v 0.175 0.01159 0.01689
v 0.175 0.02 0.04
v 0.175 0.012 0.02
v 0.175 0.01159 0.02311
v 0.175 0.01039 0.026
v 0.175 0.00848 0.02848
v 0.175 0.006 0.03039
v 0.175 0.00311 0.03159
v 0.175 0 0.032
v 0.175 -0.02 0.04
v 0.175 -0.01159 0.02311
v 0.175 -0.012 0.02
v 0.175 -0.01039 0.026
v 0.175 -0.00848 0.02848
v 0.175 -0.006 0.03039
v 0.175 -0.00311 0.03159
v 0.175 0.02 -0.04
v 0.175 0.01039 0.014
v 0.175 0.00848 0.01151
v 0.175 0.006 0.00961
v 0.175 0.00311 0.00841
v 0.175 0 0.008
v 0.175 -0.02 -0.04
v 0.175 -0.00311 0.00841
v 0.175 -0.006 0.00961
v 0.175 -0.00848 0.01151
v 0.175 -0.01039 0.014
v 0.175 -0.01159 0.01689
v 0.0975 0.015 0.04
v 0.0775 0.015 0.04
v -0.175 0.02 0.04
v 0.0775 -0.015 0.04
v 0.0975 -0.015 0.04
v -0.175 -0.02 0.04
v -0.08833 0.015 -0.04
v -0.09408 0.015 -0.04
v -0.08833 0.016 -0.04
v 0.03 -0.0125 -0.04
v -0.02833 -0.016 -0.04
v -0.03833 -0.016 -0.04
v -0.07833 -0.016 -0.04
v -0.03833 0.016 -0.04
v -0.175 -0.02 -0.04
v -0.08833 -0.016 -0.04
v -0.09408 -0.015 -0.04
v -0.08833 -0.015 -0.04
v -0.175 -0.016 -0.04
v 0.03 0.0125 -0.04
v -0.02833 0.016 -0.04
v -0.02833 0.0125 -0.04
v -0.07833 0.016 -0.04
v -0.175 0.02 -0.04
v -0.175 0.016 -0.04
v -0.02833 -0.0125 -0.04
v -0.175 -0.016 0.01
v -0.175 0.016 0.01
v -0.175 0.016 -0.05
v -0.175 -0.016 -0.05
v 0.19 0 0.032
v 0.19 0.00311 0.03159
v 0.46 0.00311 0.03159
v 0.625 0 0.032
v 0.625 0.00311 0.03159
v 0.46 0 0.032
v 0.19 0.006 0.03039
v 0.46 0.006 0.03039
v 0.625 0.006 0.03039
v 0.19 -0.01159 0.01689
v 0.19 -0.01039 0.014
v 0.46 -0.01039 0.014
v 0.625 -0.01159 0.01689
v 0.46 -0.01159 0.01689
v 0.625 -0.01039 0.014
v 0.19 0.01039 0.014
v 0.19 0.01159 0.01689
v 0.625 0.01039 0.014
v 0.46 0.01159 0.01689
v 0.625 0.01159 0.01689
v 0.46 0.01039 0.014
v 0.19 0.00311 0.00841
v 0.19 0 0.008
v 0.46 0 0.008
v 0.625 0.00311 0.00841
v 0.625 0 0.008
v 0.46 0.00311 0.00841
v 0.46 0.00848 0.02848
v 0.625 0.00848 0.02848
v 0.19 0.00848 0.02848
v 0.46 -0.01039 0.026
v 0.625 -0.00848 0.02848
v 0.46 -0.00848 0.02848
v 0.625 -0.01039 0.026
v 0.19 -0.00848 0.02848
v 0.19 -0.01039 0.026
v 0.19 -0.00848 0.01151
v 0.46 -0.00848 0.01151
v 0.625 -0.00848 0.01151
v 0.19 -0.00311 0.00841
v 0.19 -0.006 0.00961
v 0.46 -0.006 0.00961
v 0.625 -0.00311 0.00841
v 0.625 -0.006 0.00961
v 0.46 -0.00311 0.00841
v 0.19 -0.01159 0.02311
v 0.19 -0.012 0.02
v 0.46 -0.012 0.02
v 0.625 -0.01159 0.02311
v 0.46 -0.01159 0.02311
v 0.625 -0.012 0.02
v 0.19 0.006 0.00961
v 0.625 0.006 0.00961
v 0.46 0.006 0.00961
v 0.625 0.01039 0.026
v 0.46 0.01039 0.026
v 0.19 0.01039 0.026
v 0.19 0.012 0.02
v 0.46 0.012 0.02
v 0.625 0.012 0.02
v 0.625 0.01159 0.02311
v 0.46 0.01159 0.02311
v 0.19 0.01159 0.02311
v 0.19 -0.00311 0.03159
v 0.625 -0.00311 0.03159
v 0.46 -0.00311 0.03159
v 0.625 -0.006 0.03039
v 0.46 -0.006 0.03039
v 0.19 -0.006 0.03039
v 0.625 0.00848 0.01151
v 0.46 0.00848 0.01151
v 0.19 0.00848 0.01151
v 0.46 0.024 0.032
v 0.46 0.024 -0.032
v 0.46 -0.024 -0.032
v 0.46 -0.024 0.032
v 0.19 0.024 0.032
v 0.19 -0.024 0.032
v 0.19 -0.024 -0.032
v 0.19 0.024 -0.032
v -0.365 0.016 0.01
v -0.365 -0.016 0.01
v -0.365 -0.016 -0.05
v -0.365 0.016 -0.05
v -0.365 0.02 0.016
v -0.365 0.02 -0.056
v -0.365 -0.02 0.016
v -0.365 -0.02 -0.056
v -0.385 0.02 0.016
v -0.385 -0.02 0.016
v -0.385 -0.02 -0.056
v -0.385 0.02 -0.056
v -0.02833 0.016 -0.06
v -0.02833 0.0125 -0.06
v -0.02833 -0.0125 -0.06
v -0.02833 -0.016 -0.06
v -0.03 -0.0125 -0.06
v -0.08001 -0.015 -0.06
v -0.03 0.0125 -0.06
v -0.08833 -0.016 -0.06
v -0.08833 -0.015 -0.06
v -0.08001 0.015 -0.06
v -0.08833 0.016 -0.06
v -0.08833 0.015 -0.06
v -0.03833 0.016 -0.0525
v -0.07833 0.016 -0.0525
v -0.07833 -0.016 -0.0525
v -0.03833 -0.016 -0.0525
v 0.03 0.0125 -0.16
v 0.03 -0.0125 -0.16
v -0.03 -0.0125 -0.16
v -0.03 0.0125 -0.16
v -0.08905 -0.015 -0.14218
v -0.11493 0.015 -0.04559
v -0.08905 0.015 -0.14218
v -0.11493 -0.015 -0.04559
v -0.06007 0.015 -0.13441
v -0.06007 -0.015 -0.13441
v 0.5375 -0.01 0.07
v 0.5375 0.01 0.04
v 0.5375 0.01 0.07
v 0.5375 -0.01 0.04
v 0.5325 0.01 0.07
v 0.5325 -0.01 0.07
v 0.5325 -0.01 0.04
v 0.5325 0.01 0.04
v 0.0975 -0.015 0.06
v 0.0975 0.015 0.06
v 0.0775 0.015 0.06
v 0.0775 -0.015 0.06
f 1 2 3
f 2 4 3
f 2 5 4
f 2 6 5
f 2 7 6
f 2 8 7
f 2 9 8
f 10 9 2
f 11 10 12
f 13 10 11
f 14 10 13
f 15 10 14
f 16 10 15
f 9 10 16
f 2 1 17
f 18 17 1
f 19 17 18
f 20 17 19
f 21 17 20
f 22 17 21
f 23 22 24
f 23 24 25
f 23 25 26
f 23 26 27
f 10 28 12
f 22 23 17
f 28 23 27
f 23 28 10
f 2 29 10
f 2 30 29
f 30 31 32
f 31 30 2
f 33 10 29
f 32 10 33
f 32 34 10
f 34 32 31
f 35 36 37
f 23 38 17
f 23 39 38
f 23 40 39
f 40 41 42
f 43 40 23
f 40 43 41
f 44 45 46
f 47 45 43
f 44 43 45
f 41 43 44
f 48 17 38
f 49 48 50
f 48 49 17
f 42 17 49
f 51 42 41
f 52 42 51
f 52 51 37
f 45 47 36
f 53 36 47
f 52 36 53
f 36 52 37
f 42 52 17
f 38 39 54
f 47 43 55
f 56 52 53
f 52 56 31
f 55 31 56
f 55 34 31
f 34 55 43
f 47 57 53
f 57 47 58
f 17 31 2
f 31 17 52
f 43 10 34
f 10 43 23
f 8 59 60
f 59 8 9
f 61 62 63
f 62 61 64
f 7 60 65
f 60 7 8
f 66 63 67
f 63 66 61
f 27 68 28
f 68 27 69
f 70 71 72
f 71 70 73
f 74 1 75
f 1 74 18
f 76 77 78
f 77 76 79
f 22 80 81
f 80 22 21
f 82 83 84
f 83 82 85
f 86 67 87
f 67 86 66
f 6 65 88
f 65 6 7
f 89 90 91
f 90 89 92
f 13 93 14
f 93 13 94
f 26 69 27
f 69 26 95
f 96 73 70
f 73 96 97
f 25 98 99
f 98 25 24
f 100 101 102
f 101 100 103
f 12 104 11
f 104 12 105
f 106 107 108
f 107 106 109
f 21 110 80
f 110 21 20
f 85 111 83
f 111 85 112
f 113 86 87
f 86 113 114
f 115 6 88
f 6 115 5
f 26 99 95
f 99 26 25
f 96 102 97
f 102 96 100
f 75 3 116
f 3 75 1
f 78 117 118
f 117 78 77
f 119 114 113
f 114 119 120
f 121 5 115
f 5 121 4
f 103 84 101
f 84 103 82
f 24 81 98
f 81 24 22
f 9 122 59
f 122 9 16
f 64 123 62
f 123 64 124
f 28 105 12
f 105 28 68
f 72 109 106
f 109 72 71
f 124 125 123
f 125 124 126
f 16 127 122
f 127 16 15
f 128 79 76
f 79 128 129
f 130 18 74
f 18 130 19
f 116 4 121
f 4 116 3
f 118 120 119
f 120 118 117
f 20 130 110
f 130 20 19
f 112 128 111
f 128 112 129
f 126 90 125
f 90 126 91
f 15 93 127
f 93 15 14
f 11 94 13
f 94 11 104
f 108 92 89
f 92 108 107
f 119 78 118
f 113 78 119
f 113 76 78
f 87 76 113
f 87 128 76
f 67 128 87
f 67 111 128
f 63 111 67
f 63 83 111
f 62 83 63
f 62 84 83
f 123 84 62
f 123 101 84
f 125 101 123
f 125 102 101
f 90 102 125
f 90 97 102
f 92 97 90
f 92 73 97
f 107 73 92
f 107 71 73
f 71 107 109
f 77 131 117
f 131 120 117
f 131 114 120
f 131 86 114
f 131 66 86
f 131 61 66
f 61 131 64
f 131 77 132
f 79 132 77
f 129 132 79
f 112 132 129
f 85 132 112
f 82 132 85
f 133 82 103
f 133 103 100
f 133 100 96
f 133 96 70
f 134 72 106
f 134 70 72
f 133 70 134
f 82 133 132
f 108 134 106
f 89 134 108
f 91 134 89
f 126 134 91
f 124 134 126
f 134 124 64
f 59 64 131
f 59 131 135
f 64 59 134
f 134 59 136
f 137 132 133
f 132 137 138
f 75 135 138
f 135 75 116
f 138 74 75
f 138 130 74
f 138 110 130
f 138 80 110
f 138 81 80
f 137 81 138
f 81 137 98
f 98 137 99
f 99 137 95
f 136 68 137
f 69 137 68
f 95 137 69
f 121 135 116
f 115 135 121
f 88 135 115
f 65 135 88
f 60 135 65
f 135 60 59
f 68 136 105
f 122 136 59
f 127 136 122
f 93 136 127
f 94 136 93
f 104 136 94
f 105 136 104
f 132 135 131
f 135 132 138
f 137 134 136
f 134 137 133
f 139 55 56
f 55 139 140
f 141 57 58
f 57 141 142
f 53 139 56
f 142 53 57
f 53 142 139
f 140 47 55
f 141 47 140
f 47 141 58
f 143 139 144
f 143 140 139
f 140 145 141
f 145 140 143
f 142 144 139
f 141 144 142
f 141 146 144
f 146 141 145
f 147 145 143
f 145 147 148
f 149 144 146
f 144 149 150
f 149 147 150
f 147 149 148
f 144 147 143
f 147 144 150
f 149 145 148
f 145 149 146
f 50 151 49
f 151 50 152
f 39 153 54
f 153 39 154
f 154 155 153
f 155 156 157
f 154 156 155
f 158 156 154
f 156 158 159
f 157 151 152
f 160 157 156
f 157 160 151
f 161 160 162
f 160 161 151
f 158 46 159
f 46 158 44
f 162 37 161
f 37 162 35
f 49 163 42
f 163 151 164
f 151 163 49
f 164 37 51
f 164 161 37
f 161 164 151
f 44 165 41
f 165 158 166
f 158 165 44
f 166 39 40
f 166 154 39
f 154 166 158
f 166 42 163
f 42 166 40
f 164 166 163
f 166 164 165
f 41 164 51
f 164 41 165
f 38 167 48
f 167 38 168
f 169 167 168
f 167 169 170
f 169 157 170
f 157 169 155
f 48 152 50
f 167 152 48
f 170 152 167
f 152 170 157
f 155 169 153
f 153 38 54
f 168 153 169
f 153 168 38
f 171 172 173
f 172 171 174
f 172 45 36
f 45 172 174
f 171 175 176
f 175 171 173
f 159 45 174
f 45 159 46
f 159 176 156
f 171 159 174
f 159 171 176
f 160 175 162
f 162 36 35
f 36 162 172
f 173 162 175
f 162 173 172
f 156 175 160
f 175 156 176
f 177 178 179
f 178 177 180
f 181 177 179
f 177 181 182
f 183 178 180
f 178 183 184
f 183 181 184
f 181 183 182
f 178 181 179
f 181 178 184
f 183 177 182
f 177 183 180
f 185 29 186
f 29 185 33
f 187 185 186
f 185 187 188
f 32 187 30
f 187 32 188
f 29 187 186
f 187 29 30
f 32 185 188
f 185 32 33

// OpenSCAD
// Arena Shooter - Rifle Model
// Assault rifle style weapon (~80cm long)
// Units in meters

$fn = 24;

// Rifle dimensions
total_length = 0.8;
barrel_length = 0.45;
barrel_radius = 0.012;
body_length = 0.35;
body_height = 0.08;
body_width = 0.04;
stock_length = 0.2;
stock_height = 0.06;
mag_height = 0.12;
mag_width = 0.025;
mag_depth = 0.06;
grip_height = 0.1;
grip_width = 0.03;

module rifle() {
    color([0.2, 0.2, 0.2]) {
        // Main body/receiver
        translate([0, 0, 0])
            cube([body_length, body_width, body_height], center=true);

        // Barrel
        translate([body_length/2 + barrel_length/2, 0, body_height/4])
            rotate([0, 90, 0])
            cylinder(h=barrel_length, r=barrel_radius, center=true);

        // Barrel shroud/handguard
        translate([body_length/2 + barrel_length/3, 0, 0])
            cube([barrel_length * 0.6, body_width * 1.2, body_height * 0.8], center=true);

        // Stock
        translate([-body_length/2 - stock_length/2, 0, -body_height/4])
            cube([stock_length, body_width * 0.8, stock_height], center=true);

        // Stock buttpad
        translate([-body_length/2 - stock_length, 0, -body_height/4])
            cube([0.02, body_width, stock_height * 1.2], center=true);
    }

    // Magazine
    color([0.15, 0.15, 0.15])
    translate([0, 0, -body_height/2 - mag_height/2])
        cube([mag_depth, mag_width, mag_height], center=true);

    // Grip
    color([0.3, 0.2, 0.1])
    translate([-body_length/4, 0, -body_height/2 - grip_height/2])
        rotate([0, -15, 0])
        cube([grip_width, grip_width, grip_height], center=true);

    // Front sight
    color([0.1, 0.1, 0.1])
    translate([body_length/2 + barrel_length * 0.8, 0, body_height/2 + 0.015])
        cube([0.005, 0.02, 0.03], center=true);

    // Rear sight
    color([0.1, 0.1, 0.1])
    translate([body_length/4, 0, body_height/2 + 0.01])
        cube([0.02, 0.03, 0.02], center=true);

    // Trigger guard
    color([0.2, 0.2, 0.2])
    translate([-body_length/6, 0, -body_height/2])
        difference() {
            cube([0.06, body_width * 0.8, 0.04], center=true);
            cube([0.04, body_width, 0.025], center=true);
        }
}

// Generate the model (centered at origin, pointing in +X direction)
rifle();
